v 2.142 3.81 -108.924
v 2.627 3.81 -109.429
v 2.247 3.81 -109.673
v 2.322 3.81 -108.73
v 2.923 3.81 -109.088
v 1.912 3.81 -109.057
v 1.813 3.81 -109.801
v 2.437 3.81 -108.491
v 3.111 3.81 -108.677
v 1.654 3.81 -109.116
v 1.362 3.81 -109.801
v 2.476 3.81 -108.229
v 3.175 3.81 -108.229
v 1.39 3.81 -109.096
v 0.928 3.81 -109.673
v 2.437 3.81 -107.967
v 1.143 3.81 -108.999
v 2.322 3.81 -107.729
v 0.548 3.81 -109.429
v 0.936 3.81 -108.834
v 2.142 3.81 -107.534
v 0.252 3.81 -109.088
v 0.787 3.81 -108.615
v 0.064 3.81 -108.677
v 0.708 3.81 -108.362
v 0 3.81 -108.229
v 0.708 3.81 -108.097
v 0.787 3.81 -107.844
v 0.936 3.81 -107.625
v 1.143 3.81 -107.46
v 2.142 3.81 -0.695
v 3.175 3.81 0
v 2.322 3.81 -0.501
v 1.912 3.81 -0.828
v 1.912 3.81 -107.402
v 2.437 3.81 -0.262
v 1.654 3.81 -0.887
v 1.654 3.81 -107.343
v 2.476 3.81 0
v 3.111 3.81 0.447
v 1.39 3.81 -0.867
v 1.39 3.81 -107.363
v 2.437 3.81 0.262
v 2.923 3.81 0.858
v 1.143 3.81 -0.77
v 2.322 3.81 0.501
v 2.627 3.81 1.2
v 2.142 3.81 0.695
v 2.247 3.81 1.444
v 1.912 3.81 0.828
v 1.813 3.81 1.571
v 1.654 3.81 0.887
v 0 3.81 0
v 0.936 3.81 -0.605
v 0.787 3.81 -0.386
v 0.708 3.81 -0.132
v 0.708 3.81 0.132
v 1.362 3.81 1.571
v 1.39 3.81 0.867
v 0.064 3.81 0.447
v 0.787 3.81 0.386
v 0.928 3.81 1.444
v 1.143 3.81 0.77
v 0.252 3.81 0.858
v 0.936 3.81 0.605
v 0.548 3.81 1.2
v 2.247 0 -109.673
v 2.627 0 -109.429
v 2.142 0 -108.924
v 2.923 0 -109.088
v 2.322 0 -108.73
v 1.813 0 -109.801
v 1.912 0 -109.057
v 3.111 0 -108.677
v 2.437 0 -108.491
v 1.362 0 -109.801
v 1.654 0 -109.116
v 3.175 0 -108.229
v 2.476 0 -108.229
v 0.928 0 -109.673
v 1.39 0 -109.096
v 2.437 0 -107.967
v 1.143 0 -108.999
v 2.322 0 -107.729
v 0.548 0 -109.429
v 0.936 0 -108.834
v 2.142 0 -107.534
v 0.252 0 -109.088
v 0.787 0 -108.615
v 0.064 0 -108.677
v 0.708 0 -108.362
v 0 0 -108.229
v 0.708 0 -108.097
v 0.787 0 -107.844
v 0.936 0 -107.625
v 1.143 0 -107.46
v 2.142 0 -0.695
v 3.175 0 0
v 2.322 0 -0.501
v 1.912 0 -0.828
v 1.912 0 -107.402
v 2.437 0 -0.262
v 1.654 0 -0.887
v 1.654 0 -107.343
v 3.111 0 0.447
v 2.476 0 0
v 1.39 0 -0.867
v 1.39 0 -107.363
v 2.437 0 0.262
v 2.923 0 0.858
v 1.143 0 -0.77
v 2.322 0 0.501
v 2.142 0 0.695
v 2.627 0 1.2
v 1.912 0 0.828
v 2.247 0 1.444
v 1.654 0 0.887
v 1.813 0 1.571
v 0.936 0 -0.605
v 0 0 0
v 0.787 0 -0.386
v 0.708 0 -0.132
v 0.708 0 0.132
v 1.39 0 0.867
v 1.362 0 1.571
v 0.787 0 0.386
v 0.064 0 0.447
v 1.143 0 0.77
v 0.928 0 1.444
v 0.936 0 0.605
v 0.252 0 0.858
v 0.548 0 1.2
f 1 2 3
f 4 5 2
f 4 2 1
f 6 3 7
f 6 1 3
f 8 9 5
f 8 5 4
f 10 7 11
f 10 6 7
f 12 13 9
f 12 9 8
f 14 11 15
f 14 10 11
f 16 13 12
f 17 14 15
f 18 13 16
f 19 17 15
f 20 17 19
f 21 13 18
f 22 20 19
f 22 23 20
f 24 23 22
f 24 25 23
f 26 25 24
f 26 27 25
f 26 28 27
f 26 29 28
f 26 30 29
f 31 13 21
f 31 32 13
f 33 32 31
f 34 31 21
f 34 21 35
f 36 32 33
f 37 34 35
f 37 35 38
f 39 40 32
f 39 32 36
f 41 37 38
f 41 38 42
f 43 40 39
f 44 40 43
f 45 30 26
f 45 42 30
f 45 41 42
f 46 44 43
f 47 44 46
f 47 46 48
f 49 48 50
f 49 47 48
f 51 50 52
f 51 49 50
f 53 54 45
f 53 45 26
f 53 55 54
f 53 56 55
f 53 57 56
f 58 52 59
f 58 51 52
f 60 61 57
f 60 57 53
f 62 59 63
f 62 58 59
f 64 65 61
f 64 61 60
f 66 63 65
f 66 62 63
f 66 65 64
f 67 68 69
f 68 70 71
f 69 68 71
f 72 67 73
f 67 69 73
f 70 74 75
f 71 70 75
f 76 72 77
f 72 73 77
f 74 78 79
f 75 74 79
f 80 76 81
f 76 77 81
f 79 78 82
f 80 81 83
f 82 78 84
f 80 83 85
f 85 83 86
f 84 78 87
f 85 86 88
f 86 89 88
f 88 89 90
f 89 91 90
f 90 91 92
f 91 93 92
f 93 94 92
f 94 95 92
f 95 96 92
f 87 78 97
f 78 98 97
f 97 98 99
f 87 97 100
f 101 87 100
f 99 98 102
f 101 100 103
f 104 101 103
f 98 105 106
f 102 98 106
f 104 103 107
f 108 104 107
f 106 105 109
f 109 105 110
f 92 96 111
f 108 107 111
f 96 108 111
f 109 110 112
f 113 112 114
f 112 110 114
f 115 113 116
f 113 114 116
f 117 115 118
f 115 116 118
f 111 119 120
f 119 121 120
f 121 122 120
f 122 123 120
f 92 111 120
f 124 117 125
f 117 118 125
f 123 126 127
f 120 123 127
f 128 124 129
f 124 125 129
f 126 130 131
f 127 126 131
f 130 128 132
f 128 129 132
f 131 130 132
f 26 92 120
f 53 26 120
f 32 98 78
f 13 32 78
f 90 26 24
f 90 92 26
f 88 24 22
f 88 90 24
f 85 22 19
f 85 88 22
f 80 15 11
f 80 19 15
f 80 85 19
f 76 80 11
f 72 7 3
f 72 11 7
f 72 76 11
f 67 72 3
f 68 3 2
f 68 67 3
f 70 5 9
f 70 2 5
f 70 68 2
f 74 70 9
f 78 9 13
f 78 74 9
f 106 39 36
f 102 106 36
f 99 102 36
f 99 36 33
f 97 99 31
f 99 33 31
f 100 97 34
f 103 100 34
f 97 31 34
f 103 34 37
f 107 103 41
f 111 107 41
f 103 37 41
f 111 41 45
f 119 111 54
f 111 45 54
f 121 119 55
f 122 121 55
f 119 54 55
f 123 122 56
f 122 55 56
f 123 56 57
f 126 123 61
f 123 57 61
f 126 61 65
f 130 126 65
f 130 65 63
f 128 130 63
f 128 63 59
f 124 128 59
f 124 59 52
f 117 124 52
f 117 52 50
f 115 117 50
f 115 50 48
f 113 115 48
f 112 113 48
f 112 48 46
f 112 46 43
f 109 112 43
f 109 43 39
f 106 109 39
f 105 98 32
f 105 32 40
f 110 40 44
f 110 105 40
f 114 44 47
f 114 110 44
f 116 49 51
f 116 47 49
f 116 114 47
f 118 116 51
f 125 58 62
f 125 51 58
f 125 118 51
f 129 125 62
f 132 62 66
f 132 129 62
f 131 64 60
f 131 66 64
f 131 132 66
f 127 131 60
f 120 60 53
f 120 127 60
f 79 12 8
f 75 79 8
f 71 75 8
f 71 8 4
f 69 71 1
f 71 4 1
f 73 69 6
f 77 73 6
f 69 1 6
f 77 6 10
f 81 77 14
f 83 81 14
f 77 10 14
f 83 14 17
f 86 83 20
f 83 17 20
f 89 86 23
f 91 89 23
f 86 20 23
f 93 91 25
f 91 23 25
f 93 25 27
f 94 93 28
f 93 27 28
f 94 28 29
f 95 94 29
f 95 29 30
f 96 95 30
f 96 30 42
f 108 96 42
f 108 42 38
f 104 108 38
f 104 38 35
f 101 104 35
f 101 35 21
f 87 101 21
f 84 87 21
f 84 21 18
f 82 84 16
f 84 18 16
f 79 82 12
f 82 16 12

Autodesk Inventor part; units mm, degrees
ref_plane "YZ Plane" through (0, 0, 0) normal (1, 0, 0) x (0, 1, 0)
ref_plane "XZ Plane" through (0, 0, 0) normal (0, 1, 0) x (-1, 0, 0)
ref_plane "XY Plane" through (0, 0, 0) normal (0, 0, 1) x (1, 0, 0)
sketch "Sketch1" plane through (0, 0, 0) normal (0, 1, 0) x (-1, 0, 0)
  line L0 (-3.175, 0) -> (-3.175, -108.2294)
  line L1 (0, -108.2294) -> (0, 0)
  arc A0 (0, 0) -> (-3.175, 0) centre (-1.5875, 0) ccw
  arc A1 (-3.175, -108.2294) -> (0, -108.2294) centre (-1.5875, -108.2294) ccw
  dimension "d0" = 3.175
  dimension "d1" = 108.2294
extrude "Extrusion1" add sketch "Sketch1" along normal blind 3.81
sketch "Sketch2" plane through (0, 3.81, 0) normal (0, 1, 0) x (1, 0, 0)
  arc A0 (0, 0) -> (3.175, 0) centre (1.5875, 0) ccw projected
  circle A1 centre (1.5875, 0) radius 0.889
  arc A2 (3.175, 108.2294) -> (0, 108.2294) centre (1.5875, 108.2294) ccw projected
  circle A3 centre (1.5875, 108.2294) radius 0.889
  dimension "d4" = 1.778
extrude "Extrusion2" cut sketch "Sketch2" against normal blind 3.81
properties part number "scrambler_spider_support2"
